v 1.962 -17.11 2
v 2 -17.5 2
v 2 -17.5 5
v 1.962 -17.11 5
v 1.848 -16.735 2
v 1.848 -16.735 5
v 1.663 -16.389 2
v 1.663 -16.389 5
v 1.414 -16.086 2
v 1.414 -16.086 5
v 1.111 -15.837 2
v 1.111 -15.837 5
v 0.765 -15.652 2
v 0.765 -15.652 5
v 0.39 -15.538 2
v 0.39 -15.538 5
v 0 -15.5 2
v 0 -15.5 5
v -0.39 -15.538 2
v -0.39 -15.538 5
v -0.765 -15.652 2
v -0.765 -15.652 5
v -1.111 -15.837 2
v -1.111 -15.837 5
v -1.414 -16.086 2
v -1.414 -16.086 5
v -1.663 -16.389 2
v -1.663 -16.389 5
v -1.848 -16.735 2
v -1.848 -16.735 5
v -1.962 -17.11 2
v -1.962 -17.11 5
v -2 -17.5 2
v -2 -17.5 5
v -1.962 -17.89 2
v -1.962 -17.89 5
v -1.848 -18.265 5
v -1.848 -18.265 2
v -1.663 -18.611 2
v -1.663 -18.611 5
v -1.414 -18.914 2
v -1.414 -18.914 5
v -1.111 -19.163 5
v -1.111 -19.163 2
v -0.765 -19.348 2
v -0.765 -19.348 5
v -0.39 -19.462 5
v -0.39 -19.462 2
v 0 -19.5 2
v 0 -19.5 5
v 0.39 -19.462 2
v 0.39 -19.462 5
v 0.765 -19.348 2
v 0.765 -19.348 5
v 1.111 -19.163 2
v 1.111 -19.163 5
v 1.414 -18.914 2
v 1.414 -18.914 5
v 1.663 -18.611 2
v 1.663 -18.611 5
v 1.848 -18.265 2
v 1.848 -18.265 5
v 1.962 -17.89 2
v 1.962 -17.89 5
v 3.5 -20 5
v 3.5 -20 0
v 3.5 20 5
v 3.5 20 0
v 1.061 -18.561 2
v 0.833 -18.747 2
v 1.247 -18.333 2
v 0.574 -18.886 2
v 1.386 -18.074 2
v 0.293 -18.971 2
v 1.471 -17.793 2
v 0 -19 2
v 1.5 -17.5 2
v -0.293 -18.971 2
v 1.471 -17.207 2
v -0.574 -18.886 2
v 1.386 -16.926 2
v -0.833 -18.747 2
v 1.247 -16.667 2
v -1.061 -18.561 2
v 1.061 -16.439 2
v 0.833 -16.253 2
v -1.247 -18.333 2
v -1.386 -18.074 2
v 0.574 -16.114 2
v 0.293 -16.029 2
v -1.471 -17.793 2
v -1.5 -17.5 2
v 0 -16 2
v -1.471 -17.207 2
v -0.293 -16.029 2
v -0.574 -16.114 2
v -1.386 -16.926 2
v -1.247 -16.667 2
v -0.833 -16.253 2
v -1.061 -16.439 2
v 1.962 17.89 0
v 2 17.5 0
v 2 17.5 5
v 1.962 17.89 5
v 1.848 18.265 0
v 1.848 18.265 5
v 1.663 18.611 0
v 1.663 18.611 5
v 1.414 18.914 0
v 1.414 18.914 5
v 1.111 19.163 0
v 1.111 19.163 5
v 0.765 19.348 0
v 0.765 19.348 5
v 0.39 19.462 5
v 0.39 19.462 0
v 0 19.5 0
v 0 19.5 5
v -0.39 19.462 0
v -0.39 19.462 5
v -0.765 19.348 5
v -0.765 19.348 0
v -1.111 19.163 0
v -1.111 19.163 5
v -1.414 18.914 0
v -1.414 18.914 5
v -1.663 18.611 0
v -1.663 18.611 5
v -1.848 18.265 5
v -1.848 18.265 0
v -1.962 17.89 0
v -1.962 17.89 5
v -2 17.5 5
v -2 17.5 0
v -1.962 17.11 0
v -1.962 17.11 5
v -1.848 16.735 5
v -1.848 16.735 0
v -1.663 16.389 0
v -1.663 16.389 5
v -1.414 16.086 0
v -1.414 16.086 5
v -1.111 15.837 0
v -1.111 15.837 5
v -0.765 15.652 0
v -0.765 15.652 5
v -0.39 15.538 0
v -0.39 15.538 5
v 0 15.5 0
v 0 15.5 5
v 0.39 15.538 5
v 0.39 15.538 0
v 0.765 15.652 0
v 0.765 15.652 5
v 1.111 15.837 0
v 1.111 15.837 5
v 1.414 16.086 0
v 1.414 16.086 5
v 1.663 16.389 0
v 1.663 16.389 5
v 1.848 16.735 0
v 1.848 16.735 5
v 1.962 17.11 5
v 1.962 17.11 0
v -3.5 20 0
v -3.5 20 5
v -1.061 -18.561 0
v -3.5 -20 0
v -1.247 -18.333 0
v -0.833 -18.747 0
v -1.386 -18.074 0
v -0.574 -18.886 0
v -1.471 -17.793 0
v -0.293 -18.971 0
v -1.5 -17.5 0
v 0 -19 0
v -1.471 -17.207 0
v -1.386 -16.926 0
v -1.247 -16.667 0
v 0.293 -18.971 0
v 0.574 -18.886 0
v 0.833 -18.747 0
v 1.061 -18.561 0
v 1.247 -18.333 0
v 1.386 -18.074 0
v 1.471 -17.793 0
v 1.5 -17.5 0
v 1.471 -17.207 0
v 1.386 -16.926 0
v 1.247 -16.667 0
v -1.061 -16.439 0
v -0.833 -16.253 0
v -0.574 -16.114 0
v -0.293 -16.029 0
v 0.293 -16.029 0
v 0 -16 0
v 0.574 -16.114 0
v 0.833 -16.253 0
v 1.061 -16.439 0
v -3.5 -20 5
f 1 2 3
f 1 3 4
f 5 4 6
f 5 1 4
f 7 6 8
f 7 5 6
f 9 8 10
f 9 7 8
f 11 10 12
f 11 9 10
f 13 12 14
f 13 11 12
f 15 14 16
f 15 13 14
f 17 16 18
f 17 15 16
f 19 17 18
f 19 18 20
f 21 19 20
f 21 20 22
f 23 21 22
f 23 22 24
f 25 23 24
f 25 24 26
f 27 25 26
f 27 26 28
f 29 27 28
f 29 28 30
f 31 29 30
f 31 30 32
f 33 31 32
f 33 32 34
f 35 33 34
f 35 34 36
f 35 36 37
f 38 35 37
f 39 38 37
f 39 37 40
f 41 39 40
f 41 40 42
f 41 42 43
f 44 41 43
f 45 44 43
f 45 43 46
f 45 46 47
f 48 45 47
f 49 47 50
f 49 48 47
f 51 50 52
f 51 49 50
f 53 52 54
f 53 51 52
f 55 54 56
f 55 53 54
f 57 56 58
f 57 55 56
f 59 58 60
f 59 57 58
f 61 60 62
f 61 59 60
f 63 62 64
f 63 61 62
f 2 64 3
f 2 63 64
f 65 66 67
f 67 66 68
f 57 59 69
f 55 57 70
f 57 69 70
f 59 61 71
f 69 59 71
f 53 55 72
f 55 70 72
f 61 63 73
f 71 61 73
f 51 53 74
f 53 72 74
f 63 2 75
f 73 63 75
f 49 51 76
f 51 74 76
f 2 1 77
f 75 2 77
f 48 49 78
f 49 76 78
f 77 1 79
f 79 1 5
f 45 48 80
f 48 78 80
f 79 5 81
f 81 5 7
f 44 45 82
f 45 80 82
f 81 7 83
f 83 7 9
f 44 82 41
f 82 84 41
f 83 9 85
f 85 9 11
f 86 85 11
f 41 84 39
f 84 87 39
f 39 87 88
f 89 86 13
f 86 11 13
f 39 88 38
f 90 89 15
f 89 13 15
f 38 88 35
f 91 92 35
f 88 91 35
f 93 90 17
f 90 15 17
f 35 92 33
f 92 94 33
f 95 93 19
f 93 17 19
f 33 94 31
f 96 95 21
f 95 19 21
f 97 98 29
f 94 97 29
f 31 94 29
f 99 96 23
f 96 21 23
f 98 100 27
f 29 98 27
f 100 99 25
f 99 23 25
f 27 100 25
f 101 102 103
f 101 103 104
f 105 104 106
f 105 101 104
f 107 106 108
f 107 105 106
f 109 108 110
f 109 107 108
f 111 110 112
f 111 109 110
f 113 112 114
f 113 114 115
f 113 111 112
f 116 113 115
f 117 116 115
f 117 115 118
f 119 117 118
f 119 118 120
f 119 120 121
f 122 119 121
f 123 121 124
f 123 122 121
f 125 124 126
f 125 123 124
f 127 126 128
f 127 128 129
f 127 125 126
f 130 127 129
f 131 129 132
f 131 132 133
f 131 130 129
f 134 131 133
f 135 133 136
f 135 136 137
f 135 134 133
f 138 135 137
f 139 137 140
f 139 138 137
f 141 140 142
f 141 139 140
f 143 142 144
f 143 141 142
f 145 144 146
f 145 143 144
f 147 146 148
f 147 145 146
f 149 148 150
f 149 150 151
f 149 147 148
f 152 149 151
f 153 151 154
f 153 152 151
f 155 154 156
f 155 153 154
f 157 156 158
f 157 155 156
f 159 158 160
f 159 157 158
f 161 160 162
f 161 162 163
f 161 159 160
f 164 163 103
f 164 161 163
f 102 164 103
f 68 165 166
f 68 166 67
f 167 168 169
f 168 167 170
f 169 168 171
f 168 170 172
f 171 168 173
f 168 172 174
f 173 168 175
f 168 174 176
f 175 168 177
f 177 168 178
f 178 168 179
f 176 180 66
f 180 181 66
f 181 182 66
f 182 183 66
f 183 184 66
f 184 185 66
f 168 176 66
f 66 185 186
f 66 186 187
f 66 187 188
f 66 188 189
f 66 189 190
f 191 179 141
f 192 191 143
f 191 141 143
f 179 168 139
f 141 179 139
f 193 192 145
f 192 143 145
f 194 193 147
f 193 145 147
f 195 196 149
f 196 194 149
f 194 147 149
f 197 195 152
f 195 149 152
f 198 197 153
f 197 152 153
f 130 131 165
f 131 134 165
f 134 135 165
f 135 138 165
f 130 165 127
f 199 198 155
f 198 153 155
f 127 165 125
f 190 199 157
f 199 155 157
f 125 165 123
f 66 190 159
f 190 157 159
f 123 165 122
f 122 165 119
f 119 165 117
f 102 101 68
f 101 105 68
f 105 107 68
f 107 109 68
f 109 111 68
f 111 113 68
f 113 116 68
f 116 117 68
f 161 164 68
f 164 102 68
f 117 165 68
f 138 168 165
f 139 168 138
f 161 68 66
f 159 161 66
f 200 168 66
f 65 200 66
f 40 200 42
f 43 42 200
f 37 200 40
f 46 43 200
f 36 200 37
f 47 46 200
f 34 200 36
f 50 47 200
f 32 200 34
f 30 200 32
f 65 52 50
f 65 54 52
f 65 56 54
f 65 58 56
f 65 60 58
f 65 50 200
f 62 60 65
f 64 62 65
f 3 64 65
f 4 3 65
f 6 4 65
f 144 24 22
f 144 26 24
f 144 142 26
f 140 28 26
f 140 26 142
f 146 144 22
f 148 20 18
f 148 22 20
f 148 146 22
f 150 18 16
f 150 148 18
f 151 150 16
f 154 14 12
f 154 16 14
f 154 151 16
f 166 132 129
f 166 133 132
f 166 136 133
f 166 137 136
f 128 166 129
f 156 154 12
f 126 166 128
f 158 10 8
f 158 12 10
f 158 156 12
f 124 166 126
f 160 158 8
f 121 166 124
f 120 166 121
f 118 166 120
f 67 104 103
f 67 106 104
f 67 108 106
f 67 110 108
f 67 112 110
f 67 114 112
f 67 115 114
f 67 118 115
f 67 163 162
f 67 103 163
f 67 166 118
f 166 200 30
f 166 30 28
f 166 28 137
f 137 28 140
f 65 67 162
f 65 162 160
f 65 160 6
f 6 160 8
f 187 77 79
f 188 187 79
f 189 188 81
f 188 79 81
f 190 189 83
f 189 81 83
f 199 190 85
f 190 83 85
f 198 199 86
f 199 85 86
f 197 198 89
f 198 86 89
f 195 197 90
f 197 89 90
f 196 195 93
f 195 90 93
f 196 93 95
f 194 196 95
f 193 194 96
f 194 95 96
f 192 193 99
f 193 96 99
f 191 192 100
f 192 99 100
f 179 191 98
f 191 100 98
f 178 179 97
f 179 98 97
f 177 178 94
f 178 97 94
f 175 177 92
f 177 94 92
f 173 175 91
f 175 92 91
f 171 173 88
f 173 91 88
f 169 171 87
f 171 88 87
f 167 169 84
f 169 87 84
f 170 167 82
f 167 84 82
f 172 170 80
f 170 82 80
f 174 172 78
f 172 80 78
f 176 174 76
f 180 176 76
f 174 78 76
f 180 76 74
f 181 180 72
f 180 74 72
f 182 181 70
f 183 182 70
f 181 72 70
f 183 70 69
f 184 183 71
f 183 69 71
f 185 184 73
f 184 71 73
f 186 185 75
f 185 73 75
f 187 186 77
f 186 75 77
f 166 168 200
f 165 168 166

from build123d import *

# Parameters (mm, degrees)
SKETCH1_W           = 7
SKETCH1_H           = 40
SKETCH1_R           = 2
BOSS_EXTRUDE1_DEPTH = 5
SKETCH3_R           = 2.25
BOSS_EXTRUDE2_DEPTH = 2
SKETCH4_R           = 1.5
CUT_EXTRUDE1_DEPTH  = 2


with BuildPart() as part:
    # Sketch1 → Boss-Extrude1 (new body)
    with BuildSketch(Plane.XY):
        Rectangle(SKETCH1_W, SKETCH1_H)
        with Locations((0, 17.5)):
            Circle(SKETCH1_R, mode=Mode.SUBTRACT)
        with Locations((0, -17.5)):
            Circle(SKETCH1_R, mode=Mode.SUBTRACT)
    extrude(amount=BOSS_EXTRUDE1_DEPTH)

    # Sketch3 → Boss-Extrude2 (add)
    with BuildSketch(Plane(origin=(0, 0, 0), x_dir=(-1, 0, 0), z_dir=(0, 0, -1))):
        with Locations((0, -17.5)):
            Circle(SKETCH3_R)
    extrude(amount=-BOSS_EXTRUDE2_DEPTH)

    # Sketch4 → Cut-Extrude1 (cut)
    with BuildSketch(Plane.XY.offset(2)):
        with Locations((0, -17.5)):
            Circle(SKETCH4_R)
    extrude(amount=-CUT_EXTRUDE1_DEPTH, mode=Mode.SUBTRACT)


solid = part.part
